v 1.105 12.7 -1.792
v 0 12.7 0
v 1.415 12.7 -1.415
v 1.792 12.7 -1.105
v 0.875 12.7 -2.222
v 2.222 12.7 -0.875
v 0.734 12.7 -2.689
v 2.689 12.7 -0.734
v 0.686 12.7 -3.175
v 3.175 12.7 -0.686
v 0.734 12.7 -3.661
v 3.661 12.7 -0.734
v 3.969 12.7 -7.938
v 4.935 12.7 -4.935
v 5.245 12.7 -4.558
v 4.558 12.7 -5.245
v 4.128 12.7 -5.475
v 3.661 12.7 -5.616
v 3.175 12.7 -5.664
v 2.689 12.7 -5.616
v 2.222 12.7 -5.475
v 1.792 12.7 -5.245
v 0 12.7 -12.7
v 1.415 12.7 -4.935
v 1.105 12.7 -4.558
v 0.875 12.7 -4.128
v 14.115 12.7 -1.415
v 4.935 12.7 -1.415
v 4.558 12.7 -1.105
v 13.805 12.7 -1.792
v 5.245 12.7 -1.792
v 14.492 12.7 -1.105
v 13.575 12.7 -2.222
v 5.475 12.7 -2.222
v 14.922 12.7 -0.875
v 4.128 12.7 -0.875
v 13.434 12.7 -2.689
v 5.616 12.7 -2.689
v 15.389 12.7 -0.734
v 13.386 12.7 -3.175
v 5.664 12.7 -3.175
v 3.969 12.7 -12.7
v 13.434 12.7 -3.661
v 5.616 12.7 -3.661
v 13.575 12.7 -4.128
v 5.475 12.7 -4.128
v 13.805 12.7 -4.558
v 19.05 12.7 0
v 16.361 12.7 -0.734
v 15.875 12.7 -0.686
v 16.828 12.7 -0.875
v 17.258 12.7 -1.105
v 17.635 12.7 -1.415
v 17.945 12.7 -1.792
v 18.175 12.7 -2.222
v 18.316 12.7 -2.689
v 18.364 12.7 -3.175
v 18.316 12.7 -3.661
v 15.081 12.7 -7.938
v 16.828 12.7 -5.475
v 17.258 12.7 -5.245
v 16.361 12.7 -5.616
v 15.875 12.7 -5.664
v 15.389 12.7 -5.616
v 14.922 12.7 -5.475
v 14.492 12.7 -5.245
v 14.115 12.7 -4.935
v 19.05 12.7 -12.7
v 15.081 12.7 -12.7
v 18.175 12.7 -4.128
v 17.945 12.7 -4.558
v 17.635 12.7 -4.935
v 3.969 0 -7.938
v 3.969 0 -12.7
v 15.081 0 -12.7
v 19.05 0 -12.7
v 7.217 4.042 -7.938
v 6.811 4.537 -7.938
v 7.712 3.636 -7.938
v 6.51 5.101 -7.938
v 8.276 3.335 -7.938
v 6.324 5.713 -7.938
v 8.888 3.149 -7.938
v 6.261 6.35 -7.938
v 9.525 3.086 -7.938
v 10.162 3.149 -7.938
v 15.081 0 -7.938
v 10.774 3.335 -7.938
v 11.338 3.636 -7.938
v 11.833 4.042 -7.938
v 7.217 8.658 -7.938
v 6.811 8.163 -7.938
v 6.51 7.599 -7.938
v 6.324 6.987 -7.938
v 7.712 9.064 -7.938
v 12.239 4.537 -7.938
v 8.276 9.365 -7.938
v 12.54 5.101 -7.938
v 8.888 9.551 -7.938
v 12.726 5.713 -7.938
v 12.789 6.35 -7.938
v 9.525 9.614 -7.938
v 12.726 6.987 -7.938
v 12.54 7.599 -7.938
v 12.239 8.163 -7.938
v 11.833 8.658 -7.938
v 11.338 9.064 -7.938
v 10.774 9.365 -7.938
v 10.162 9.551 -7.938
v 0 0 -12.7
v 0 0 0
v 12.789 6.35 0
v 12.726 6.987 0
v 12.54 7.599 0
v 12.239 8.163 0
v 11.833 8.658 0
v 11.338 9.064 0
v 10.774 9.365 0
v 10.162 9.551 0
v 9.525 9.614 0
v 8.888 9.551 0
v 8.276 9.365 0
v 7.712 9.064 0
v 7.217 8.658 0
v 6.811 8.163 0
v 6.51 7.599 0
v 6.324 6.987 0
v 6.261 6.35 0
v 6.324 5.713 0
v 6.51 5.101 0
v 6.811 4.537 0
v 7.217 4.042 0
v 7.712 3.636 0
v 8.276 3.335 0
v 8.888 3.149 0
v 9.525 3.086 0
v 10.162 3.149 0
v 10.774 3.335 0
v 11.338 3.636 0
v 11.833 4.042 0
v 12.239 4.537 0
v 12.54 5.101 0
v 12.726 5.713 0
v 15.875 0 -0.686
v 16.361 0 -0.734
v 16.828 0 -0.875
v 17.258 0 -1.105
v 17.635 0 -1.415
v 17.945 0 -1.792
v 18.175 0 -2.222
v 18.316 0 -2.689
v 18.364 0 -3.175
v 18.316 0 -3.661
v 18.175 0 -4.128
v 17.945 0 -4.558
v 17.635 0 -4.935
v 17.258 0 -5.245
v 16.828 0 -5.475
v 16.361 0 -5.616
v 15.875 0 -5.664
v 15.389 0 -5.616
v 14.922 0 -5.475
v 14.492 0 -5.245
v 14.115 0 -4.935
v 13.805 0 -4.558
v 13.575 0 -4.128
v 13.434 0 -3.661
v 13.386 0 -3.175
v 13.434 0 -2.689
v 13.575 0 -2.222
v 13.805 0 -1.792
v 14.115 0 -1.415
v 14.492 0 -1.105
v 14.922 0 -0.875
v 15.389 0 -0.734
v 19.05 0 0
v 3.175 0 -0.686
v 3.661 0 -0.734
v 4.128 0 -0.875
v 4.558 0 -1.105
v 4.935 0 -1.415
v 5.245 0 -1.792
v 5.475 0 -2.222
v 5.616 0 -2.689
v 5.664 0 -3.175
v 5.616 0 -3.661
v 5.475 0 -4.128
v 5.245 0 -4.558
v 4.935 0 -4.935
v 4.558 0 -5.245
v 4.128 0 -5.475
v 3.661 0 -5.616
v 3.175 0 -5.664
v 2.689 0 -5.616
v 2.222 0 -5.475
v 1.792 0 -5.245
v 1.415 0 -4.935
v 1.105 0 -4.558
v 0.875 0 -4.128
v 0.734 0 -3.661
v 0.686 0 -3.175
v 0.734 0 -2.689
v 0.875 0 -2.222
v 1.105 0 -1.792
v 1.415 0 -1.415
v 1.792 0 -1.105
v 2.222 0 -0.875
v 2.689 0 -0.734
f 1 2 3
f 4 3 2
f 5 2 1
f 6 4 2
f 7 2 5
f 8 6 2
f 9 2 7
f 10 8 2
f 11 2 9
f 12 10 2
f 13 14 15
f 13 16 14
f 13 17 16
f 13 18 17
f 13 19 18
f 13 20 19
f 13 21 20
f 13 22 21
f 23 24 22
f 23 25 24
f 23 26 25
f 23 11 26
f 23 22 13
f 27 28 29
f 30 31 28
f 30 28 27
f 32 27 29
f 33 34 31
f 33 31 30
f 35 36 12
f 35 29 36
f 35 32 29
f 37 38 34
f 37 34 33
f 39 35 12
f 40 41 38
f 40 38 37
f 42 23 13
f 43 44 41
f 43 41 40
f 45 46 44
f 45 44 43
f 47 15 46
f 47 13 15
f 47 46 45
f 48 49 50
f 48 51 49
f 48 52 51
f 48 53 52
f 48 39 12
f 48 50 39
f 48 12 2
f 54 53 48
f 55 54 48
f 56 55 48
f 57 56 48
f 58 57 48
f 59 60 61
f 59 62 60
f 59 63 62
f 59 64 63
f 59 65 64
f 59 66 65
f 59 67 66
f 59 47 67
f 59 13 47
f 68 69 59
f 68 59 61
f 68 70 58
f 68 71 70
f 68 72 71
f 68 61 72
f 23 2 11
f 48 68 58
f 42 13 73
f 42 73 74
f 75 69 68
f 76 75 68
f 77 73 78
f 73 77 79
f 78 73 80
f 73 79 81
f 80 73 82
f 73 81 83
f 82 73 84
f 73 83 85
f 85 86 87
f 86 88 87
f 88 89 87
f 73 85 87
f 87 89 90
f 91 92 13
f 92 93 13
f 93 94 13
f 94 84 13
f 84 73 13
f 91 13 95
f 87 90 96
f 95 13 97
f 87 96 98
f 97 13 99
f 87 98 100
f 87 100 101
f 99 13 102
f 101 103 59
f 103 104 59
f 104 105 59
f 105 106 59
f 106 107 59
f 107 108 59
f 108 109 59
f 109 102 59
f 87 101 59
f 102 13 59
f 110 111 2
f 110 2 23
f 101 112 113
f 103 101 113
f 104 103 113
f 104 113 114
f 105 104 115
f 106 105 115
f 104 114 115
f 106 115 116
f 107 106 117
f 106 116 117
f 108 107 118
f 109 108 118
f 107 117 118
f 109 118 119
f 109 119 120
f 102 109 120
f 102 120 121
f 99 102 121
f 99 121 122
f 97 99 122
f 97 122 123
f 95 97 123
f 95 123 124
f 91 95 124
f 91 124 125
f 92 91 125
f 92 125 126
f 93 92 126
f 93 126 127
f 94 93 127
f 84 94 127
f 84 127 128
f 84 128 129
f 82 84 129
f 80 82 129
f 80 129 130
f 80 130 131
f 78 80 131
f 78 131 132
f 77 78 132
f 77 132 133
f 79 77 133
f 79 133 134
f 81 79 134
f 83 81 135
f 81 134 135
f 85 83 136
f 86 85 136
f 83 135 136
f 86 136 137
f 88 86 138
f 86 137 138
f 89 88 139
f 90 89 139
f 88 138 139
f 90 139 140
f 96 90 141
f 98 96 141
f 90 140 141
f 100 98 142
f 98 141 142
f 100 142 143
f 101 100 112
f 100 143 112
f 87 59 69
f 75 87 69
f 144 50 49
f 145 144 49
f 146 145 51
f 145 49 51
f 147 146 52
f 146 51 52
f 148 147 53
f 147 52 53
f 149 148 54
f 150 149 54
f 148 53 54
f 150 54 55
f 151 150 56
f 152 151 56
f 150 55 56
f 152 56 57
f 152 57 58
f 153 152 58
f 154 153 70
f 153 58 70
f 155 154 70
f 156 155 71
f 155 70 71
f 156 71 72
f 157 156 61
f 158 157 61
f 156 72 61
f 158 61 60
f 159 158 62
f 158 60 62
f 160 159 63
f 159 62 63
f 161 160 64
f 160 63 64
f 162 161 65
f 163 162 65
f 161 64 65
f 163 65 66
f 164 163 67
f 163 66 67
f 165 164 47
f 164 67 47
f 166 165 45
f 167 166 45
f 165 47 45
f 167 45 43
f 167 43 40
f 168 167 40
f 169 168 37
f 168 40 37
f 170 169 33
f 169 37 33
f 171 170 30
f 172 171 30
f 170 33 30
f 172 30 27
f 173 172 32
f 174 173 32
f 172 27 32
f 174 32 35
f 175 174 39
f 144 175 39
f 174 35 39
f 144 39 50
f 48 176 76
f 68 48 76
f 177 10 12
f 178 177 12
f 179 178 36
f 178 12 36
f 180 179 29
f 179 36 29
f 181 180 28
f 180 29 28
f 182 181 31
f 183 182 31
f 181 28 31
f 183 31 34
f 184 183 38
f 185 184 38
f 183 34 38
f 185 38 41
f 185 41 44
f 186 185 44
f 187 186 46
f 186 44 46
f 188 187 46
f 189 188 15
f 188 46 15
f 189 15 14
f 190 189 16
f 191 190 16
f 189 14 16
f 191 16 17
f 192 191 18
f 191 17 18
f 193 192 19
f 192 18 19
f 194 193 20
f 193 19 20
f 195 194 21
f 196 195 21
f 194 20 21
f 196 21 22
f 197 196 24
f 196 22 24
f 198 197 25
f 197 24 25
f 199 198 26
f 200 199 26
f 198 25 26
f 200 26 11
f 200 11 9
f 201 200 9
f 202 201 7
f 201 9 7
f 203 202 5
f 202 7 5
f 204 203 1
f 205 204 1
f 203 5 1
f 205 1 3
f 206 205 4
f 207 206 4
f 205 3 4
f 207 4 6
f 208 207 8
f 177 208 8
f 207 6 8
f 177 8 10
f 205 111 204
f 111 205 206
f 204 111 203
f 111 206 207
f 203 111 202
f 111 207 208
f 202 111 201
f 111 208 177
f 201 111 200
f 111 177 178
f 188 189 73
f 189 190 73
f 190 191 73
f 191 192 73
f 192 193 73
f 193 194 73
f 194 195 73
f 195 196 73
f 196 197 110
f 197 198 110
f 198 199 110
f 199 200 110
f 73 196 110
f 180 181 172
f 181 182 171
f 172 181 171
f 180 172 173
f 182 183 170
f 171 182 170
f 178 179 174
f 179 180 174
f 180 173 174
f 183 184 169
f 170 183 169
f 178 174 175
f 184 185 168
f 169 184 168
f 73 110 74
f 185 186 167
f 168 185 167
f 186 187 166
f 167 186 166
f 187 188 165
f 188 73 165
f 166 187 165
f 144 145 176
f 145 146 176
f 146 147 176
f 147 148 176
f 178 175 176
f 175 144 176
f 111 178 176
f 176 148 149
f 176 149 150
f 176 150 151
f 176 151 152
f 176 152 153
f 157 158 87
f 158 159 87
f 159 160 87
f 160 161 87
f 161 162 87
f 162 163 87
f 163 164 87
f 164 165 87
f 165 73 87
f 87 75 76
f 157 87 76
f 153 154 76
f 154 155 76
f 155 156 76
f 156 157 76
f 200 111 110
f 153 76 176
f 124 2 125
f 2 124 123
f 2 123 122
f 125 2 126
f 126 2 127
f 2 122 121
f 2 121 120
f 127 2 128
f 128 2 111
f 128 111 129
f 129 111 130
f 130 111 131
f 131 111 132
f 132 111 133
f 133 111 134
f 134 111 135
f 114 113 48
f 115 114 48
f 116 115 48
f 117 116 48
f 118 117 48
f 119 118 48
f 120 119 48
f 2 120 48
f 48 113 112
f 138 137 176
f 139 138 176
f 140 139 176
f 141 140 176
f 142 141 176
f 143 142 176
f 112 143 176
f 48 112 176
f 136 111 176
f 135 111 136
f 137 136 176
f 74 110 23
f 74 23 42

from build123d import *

# Parameters (mm, degrees)
SKETCH1_W           = 19.05
SKETCH1_H           = 12.7
BOSS_EXTRUDE1_DEPTH = 12.7
SKETCH2_R           = 2.4892
SKETCH2_W           = 11.1125
SKETCH2_H           = 4.7625
CUT_EXTRUDE1_DEPTH  = 12.7
SKETCH3_R           = 3.2639
CUT_EXTRUDE2_DEPTH  = 12.7


with BuildPart() as part:
    # Sketch1 → Boss-Extrude1 (new body)
    with BuildSketch(Plane(origin=(0, 0, 0), x_dir=(1, 0, 0), z_dir=(0, 1, 0))):
        with Locations((9.525, 6.35)):
            Rectangle(SKETCH1_W, SKETCH1_H)
    extrude(amount=BOSS_EXTRUDE1_DEPTH)

    # Sketch2 → Cut-Extrude1 (cut)
    with BuildSketch(Plane(origin=(0, 12.7, 0), x_dir=(1, 0, 0), z_dir=(0, 1, 0))):
        with Locations(Location((3.175, 3.175, 0), (0, 0, 270))):
            Circle(SKETCH2_R)
        with Locations(Location((15.875, 3.175, 0), (0, 0, 270))):
            Circle(SKETCH2_R)
        with Locations((9.525, 10.31875)):
            Rectangle(SKETCH2_W, SKETCH2_H)
    extrude(amount=-CUT_EXTRUDE1_DEPTH, mode=Mode.SUBTRACT)

    # Sketch3 → Cut-Extrude2 (cut)
    with BuildSketch(Plane.XY):
        with Locations((9.525, 6.35)):
            Circle(SKETCH3_R)
    extrude(amount=-CUT_EXTRUDE2_DEPTH, mode=Mode.SUBTRACT)


solid = part.part
